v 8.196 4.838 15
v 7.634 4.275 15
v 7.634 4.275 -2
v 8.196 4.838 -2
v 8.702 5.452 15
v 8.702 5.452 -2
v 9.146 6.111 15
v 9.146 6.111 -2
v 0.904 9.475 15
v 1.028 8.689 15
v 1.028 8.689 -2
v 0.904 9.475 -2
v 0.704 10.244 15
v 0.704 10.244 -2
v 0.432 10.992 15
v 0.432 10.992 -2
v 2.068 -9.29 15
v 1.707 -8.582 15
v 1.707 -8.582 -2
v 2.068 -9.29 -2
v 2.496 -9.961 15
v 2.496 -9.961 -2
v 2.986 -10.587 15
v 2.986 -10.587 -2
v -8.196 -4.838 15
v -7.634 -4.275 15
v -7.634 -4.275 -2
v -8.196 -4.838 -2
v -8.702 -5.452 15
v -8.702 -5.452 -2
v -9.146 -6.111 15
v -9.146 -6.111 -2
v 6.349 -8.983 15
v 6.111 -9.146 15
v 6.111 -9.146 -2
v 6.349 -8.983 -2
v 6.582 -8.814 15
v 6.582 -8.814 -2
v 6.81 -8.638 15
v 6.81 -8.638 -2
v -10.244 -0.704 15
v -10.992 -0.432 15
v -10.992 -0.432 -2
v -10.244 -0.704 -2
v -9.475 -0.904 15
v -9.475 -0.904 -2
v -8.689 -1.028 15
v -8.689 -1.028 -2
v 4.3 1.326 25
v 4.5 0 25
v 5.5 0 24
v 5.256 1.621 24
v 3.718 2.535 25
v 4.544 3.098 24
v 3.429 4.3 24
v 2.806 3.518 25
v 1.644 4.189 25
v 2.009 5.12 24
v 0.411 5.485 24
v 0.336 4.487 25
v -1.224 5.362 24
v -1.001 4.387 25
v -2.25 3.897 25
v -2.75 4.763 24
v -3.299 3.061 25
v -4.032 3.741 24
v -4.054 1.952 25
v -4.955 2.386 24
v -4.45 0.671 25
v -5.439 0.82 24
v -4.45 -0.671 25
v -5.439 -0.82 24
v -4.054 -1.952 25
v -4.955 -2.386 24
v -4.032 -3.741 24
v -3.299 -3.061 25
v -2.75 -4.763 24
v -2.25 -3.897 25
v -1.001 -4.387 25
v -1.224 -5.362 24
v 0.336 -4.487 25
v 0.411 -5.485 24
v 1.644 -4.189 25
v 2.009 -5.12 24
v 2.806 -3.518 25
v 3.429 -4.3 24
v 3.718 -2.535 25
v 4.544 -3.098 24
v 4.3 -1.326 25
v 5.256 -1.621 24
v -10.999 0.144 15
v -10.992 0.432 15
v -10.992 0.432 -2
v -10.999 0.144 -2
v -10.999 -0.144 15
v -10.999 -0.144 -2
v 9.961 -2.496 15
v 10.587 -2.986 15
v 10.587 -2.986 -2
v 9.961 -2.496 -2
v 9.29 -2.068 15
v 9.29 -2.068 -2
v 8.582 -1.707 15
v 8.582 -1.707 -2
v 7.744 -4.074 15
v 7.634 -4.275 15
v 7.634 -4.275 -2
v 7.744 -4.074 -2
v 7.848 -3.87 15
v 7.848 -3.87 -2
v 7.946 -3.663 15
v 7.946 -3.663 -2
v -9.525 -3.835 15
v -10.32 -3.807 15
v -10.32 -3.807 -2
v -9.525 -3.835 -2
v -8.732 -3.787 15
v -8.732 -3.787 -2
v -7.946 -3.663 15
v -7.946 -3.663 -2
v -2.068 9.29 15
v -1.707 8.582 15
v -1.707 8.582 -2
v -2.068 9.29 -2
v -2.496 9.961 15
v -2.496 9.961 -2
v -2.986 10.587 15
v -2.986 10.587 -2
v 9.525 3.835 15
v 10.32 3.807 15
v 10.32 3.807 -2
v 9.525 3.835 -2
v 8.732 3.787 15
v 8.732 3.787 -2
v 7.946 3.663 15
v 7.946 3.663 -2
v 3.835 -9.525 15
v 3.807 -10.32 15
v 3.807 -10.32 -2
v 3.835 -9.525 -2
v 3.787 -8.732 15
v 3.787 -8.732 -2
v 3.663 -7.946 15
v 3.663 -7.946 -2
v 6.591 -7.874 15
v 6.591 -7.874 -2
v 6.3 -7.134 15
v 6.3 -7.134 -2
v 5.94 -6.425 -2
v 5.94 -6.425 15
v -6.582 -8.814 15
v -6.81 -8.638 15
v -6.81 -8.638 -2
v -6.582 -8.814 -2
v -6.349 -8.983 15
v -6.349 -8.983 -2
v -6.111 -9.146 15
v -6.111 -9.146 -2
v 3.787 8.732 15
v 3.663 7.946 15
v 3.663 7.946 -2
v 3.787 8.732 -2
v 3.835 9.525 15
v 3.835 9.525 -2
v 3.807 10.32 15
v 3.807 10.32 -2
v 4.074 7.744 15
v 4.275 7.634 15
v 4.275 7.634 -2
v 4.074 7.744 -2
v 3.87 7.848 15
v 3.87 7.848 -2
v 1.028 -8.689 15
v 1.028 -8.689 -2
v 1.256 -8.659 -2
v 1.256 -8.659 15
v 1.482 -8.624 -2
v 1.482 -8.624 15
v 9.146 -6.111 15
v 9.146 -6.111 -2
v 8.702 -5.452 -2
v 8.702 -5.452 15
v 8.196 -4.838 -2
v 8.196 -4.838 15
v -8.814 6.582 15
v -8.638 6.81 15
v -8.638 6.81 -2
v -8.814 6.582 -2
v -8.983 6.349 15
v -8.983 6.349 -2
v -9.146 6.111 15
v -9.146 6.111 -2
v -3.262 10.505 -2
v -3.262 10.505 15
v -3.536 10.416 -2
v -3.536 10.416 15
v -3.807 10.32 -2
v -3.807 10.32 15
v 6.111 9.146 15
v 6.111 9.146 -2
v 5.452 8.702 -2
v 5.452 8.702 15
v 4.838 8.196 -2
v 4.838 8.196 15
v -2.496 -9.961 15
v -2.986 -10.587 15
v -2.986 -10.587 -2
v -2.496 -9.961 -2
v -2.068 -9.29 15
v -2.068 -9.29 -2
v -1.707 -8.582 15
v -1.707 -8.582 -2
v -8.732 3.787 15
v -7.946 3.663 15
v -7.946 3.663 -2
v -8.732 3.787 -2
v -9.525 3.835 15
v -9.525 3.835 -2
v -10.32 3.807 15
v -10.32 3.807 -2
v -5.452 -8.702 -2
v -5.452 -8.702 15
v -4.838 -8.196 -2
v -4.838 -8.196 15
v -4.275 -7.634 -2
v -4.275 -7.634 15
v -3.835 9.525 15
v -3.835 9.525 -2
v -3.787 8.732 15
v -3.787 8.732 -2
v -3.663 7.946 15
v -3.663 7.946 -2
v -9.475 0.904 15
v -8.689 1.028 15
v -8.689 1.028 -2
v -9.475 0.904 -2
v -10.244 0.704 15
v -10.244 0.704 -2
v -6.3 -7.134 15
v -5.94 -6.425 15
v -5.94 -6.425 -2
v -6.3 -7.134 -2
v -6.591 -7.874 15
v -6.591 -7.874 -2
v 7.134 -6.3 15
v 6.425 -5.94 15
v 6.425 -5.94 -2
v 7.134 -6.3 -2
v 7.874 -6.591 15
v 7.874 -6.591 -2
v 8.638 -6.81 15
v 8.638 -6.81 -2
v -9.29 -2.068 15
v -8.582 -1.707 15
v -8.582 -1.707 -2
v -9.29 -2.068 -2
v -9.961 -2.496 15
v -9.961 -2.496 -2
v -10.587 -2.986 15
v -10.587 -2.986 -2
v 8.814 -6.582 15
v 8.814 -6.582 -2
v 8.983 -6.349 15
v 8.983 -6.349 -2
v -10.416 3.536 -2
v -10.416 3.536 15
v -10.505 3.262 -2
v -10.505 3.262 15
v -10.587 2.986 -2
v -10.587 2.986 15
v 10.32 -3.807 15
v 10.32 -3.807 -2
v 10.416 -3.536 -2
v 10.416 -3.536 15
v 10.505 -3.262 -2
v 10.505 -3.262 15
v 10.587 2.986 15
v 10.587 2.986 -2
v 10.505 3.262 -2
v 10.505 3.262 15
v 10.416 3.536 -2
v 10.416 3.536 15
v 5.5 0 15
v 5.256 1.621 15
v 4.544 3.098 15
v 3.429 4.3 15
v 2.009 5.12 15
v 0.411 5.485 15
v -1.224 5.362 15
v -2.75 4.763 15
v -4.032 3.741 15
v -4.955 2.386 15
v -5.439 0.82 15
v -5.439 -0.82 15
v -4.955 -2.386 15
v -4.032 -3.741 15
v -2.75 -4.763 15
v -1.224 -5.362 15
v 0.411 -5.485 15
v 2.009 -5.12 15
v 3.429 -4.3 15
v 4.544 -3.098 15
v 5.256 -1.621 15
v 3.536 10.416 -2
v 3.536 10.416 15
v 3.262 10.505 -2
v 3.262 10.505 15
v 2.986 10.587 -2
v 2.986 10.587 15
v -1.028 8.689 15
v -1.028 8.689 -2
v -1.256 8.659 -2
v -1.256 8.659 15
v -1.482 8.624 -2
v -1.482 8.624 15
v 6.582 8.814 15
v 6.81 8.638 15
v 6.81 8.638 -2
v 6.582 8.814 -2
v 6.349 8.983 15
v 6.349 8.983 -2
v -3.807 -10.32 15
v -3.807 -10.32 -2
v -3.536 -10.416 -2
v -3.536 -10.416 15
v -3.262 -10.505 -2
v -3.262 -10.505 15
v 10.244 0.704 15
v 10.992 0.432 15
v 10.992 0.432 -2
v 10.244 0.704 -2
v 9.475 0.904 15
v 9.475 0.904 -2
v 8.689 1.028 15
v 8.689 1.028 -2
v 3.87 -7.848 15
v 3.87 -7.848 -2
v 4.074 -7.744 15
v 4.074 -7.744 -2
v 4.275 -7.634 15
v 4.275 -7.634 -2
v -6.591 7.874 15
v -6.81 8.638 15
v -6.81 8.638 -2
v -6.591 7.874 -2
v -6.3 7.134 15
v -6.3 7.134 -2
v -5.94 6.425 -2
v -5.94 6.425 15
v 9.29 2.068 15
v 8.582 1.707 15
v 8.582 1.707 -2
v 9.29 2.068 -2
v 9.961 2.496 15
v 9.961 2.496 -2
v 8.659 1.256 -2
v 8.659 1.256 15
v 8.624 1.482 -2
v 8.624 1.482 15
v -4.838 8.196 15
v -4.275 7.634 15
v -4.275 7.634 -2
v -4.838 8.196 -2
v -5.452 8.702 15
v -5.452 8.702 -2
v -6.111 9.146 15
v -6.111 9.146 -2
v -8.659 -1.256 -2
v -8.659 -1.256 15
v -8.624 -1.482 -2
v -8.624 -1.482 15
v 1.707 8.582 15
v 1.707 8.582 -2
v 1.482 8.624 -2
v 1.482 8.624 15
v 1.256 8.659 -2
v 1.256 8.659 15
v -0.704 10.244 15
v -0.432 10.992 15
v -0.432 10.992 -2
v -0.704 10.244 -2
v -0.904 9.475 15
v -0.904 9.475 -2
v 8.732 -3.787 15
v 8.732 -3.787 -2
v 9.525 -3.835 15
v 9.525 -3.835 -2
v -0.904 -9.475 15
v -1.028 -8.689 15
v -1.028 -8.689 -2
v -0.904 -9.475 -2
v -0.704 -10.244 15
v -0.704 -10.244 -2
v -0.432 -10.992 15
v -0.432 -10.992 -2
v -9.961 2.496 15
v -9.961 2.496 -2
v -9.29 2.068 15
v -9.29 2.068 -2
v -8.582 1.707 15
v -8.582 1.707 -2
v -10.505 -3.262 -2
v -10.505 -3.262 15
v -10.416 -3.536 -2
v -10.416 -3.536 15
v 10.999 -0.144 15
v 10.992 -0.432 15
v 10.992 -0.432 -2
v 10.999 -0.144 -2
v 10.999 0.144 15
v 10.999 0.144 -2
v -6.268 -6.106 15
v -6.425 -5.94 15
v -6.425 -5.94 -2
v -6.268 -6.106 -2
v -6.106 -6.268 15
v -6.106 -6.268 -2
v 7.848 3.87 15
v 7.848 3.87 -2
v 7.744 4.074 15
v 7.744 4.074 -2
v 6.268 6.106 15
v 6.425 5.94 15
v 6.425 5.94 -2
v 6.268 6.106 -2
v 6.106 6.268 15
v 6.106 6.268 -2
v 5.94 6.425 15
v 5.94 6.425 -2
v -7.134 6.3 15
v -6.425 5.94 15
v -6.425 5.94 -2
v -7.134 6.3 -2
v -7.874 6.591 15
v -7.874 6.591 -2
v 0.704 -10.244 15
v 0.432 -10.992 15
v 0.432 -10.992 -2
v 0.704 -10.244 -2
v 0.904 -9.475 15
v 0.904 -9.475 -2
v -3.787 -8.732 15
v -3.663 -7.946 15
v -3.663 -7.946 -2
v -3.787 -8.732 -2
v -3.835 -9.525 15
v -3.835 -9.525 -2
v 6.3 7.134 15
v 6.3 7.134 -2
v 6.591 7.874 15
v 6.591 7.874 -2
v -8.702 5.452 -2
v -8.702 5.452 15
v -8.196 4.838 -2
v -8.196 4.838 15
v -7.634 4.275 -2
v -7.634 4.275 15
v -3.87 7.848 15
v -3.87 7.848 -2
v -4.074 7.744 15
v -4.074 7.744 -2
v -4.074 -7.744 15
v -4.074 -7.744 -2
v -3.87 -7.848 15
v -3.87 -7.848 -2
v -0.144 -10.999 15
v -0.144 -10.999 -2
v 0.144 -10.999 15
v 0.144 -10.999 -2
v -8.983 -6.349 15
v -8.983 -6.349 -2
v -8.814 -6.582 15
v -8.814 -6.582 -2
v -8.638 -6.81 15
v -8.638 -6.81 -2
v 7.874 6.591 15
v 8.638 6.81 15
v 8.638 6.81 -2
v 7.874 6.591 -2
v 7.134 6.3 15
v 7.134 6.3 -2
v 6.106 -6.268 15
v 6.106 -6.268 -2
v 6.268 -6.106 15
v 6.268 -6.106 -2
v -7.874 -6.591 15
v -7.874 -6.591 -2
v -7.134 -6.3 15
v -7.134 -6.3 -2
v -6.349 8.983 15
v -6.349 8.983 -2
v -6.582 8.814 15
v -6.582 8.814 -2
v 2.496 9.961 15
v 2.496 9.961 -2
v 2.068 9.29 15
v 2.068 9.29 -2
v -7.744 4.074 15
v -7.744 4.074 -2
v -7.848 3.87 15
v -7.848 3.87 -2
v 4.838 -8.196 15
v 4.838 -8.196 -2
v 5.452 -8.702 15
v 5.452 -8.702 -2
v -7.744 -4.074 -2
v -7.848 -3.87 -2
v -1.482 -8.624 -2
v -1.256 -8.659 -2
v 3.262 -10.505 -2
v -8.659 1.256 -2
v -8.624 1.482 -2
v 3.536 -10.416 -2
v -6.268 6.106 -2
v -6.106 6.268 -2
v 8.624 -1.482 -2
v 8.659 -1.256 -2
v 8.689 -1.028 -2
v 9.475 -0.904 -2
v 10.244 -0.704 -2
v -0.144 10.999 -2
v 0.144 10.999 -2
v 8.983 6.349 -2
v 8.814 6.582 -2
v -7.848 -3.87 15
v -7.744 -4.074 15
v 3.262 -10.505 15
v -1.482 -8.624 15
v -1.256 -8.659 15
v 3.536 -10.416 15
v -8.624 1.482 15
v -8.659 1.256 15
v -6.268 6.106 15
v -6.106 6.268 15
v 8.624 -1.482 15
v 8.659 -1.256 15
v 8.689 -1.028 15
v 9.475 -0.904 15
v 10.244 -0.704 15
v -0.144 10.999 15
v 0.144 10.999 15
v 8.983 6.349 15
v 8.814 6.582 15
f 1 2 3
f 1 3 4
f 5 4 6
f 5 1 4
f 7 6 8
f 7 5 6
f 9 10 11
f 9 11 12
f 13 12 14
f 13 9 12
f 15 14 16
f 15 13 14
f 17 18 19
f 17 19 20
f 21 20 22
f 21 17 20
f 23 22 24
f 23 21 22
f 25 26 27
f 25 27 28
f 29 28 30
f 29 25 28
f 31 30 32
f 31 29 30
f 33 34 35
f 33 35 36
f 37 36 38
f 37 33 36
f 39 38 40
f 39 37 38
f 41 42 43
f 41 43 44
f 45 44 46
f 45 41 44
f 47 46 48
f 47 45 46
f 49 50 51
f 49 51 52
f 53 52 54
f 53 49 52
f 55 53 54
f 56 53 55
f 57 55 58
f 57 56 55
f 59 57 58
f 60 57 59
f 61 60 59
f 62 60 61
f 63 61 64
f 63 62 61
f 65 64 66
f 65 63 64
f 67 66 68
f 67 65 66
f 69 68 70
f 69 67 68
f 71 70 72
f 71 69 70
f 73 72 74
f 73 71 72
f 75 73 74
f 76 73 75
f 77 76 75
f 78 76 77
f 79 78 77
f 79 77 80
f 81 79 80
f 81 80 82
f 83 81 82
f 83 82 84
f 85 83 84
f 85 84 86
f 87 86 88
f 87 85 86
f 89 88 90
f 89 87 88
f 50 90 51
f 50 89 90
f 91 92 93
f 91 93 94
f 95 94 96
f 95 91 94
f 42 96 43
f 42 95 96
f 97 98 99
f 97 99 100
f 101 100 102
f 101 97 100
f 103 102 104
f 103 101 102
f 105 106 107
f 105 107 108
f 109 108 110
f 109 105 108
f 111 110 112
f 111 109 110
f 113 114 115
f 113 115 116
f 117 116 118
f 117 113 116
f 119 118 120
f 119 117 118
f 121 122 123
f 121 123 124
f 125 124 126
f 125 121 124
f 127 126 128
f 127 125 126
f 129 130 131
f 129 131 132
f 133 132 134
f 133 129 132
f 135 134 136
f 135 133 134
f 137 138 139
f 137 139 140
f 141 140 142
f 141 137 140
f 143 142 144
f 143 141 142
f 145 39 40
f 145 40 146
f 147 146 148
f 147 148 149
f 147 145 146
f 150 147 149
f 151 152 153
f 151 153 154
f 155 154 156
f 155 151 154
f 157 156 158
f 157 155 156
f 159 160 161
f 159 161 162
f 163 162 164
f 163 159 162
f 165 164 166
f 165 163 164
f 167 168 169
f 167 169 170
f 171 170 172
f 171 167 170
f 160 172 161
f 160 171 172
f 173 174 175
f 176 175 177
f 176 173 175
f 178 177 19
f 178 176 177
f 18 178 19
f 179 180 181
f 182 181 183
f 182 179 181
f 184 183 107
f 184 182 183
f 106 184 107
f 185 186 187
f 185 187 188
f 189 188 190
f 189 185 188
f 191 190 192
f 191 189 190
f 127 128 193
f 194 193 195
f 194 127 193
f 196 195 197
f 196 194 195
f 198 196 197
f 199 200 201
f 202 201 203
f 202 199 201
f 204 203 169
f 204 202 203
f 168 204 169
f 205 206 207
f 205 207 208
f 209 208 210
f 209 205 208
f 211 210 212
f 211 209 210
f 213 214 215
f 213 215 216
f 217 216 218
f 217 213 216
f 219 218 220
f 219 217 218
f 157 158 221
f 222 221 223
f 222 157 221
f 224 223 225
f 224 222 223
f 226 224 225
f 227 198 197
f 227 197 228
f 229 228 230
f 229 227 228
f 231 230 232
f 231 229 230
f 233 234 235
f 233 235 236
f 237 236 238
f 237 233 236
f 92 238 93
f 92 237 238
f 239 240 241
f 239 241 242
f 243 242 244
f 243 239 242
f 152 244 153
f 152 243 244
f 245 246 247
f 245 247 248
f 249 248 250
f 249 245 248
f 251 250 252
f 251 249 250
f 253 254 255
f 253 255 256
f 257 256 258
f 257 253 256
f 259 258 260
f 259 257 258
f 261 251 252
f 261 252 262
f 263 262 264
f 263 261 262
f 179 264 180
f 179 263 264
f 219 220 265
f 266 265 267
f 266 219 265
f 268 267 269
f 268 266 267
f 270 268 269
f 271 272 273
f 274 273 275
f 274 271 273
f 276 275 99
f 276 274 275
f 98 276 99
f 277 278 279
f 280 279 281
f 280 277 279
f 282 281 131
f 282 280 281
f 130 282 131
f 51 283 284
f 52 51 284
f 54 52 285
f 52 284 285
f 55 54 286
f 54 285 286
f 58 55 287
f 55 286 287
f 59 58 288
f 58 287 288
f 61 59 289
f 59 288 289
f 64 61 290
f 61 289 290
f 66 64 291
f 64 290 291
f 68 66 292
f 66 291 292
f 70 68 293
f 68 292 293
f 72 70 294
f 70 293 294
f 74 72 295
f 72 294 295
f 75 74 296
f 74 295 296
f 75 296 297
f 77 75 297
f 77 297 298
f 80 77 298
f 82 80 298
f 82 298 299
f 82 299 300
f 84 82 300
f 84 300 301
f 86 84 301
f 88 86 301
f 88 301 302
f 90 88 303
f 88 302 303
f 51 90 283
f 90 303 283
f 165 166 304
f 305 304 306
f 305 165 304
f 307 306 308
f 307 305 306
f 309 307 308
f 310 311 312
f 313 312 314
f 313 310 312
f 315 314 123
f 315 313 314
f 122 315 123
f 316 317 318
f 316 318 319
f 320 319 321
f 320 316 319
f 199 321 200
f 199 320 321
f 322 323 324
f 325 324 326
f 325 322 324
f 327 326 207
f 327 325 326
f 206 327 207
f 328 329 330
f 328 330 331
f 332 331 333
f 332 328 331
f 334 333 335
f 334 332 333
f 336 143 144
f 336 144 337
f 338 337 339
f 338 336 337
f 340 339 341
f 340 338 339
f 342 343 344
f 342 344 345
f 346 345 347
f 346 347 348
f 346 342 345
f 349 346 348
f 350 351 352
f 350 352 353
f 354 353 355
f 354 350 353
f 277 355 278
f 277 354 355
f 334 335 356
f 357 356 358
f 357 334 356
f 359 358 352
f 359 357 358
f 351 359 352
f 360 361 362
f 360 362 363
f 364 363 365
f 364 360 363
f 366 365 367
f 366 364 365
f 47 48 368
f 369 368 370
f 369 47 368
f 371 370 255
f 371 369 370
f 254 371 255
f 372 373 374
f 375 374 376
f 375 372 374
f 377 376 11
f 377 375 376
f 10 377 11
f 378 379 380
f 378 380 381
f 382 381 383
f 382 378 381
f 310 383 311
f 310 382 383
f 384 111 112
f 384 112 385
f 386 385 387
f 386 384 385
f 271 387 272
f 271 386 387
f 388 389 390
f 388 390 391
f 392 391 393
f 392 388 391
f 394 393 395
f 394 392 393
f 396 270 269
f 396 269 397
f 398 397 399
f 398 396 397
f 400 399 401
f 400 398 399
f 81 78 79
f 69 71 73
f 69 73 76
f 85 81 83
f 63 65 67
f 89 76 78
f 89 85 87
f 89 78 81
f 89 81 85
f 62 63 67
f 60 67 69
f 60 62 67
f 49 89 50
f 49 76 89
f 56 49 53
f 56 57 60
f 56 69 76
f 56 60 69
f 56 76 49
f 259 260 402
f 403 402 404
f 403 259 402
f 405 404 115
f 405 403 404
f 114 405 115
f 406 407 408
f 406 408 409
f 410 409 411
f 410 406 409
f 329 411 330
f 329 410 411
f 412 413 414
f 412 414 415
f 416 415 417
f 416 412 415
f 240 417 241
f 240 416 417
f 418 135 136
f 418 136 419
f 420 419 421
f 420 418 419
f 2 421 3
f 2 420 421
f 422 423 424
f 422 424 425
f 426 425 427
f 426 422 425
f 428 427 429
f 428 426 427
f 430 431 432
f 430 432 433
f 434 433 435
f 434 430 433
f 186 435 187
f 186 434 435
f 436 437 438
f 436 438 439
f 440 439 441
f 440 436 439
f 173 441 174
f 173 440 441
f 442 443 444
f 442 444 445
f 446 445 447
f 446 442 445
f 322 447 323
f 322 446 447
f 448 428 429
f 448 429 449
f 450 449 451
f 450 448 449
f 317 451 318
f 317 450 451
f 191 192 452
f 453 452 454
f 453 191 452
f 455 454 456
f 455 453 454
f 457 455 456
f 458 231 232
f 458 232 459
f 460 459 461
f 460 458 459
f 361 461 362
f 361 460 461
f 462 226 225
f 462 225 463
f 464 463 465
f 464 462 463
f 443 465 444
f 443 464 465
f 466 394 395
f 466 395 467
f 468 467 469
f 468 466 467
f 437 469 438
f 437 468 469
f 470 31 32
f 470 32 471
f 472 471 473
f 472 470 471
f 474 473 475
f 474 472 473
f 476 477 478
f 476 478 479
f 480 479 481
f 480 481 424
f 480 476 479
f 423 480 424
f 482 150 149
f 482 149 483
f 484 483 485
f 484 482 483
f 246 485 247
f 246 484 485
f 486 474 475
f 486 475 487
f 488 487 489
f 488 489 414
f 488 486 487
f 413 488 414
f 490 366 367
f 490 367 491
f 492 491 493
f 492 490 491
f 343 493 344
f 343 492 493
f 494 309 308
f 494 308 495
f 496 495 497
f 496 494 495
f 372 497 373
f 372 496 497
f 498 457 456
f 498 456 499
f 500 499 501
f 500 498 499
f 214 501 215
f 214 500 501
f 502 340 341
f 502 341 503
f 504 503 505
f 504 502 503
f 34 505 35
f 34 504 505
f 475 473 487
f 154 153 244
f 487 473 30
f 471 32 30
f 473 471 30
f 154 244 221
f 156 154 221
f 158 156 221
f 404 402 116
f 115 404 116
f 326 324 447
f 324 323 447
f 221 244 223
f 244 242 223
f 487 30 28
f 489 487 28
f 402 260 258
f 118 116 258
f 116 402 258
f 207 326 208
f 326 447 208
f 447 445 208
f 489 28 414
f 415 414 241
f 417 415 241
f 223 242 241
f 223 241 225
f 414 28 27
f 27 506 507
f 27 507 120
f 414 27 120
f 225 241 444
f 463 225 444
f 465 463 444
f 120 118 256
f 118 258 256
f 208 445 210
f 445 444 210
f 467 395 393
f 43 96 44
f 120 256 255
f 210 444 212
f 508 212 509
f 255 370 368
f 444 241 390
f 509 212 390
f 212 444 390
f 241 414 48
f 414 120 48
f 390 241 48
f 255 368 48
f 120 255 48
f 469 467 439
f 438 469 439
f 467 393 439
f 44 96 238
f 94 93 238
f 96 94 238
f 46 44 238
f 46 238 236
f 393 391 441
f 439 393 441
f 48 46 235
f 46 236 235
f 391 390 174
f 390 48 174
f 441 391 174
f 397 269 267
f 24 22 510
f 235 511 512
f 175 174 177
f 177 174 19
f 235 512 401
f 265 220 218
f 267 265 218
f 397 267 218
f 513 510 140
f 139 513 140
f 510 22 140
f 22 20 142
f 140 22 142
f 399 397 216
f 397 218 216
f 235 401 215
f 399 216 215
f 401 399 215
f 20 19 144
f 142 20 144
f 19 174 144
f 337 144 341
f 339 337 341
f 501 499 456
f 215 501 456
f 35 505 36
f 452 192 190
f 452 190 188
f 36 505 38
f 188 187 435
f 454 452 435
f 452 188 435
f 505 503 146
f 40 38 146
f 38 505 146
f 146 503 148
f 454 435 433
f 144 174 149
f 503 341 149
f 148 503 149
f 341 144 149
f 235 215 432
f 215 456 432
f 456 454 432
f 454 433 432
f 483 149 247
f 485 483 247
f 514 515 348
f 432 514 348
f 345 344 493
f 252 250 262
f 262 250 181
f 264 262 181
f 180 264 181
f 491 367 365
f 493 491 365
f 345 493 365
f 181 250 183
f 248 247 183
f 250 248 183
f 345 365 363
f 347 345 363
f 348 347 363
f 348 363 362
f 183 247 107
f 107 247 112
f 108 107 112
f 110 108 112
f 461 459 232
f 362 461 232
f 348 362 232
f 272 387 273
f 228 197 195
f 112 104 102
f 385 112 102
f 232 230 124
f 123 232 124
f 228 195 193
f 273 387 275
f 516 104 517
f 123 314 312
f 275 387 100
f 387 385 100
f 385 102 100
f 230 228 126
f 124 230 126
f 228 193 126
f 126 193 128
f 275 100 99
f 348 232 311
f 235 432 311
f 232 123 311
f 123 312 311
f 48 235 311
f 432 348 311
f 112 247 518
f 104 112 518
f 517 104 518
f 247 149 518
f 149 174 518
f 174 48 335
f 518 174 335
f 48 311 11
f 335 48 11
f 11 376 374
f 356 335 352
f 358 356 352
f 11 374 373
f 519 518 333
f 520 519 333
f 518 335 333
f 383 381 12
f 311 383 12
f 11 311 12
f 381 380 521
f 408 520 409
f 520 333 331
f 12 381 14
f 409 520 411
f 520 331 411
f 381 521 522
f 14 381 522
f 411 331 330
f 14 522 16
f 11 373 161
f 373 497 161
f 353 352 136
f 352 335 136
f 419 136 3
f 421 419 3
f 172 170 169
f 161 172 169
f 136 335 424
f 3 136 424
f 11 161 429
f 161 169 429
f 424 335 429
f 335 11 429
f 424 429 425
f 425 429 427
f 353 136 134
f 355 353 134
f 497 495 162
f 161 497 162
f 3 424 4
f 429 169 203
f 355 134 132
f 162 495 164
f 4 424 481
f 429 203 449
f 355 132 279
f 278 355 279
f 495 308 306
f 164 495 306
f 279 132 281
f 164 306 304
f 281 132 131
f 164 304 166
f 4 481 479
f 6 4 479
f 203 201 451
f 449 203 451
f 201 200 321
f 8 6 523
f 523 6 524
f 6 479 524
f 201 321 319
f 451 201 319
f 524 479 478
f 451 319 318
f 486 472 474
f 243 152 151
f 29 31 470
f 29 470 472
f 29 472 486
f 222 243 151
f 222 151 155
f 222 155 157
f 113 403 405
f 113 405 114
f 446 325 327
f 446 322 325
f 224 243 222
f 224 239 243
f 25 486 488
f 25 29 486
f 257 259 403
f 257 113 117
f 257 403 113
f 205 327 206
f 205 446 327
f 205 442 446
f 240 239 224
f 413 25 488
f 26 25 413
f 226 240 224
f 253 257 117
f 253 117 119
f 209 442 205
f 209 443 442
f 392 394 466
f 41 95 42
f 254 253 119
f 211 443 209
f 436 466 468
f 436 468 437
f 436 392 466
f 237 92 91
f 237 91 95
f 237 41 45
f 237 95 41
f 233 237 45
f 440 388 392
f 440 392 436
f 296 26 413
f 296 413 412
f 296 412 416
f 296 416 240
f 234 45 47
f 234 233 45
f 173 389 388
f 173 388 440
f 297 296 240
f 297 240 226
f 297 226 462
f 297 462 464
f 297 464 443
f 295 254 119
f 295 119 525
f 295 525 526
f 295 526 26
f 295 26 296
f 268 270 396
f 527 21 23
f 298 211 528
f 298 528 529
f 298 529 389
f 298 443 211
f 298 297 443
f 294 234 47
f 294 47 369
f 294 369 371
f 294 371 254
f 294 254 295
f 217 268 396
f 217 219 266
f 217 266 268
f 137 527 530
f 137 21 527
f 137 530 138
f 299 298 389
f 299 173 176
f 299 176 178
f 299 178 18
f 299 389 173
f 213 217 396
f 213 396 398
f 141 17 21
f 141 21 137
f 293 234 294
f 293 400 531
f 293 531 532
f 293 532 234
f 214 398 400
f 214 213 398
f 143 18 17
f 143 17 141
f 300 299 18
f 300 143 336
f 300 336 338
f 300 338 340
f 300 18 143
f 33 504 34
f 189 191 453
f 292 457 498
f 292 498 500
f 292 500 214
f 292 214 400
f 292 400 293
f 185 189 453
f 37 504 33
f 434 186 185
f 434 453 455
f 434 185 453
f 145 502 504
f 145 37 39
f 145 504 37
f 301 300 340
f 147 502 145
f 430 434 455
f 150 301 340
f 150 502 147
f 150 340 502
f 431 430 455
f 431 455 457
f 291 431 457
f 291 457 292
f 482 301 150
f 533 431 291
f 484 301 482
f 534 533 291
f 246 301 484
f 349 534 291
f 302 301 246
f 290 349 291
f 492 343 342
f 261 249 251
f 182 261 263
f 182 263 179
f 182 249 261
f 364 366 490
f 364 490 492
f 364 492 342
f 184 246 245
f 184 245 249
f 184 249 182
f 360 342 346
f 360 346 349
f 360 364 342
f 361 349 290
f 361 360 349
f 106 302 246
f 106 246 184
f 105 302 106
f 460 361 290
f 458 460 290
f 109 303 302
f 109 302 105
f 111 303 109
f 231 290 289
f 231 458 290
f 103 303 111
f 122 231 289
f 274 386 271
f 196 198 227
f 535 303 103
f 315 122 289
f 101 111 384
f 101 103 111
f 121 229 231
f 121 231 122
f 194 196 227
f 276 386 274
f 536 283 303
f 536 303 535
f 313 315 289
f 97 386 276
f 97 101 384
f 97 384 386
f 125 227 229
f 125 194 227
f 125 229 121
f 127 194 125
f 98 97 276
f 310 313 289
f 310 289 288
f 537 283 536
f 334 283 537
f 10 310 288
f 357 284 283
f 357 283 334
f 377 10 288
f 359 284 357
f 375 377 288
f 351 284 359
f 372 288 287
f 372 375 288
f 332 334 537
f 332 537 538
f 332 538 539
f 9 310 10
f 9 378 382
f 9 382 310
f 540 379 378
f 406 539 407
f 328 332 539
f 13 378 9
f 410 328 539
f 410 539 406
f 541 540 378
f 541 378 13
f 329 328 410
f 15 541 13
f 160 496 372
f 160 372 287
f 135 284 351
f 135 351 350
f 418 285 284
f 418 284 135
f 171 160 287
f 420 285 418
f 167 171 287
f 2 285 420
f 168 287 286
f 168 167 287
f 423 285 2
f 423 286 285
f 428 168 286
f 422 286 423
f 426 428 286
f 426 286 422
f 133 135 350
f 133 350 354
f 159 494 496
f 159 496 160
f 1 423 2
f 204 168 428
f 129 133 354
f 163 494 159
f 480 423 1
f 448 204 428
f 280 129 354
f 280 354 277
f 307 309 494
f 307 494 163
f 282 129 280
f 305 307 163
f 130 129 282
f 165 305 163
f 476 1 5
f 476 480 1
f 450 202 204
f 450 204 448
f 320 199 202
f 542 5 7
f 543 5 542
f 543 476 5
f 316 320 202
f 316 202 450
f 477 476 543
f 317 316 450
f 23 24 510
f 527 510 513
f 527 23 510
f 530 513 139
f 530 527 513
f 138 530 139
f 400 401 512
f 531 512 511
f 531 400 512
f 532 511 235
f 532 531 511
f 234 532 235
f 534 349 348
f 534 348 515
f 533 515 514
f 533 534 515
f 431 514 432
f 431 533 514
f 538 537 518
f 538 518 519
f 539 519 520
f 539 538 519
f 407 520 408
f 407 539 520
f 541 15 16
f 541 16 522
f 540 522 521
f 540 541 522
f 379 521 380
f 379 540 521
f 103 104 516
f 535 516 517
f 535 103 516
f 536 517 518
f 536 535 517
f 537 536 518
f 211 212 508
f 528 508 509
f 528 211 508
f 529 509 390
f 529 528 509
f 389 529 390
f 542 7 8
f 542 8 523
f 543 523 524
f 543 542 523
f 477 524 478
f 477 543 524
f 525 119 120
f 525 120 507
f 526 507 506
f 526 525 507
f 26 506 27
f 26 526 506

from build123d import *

# Parameters (mm, degrees)
AUFSATZ_LINEAR_AUSTRAGEN1_DEPTH = 17
SKIZZE2_R                       = 5.5
AUFSATZ_LINEAR_AUSTRAGEN3_DEPTH = 10
FASE1_SIZE                      = 1


with BuildPart() as part:
    # Skizze1 → Aufsatz-Linear austragen1 (new body)
    with BuildSketch(Plane.XY.offset(14.999999972)):
        with BuildLine():
            ThreePointArc((-1.707040323, 8.581871229), (-2.274158717, 9.63053951), (-2.985844941, 10.587007573))
            ThreePointArc((-2.985844941, 10.587007573), (-3.399186929, 10.461621652), (-3.807287618, 10.320104668))
            ThreePointArc((-3.807287618, 10.320104668), (-3.820856046, 9.127987084), (-3.663272714, 7.946252795))
            ThreePointArc((-3.663272714, 7.946252795), (-3.972416885, 7.79630711), (-4.275435876, 7.634340085))
            ThreePointArc((-4.275435876, 7.634340085), (-5.138853841, 8.456433665), (-6.111272547, 9.146165711))
            ThreePointArc((-6.111272547, 9.146165711), (-6.465637758, 8.899186915), (-6.810033424, 8.638486217))
            ThreePointArc((-6.810033424, 8.638486217), (-6.454553173, 7.500522146), (-5.939506541, 6.425321977))
            ThreePointArc((-5.939506541, 6.425321977), (-6.187184354, 6.187184354), (-6.425321977, 5.939506541))
            ThreePointArc((-6.425321977, 5.939506541), (-7.500522146, 6.454553173), (-8.638486217, 6.810033424))
            ThreePointArc((-8.638486217, 6.810033424), (-8.899186915, 6.465637758), (-9.146165711, 6.111272547))
            ThreePointArc((-9.146165711, 6.111272547), (-8.456433665, 5.138853841), (-7.634340085, 4.275435876))
            ThreePointArc((-7.634340085, 4.275435876), (-7.79630711, 3.972416885), (-7.946252795, 3.663272714))
            ThreePointArc((-7.946252795, 3.663272714), (-9.127987084, 3.820856046), (-10.320104668, 3.807287618))
            ThreePointArc((-10.320104668, 3.807287618), (-10.461621652, 3.399186929), (-10.587007573, 2.985844941))
            ThreePointArc((-10.587007573, 2.985844941), (-9.63053951, 2.274158717), (-8.581871229, 1.707040323))
            ThreePointArc((-8.581871229, 1.707040323), (-8.642273006, 1.368801573), (-8.689349024, 1.028452231))
            ThreePointArc((-8.689349024, 1.028452231), (-9.861941048, 0.813146907), (-10.99151937, 0.431857972))
            ThreePointArc((-10.99151937, 0.431857972), (-10.999999971, 0), (-10.99151937, -0.431857972))
            ThreePointArc((-10.99151937, -0.431857972), (-9.861941048, -0.813146907), (-8.689349024, -1.028452231))
            ThreePointArc((-8.689349024, -1.028452231), (-8.642273006, -1.368801573), (-8.581871229, -1.707040323))
            ThreePointArc((-8.581871229, -1.707040323), (-9.63053951, -2.274158717), (-10.587007573, -2.985844941))
            ThreePointArc((-10.587007573, -2.985844941), (-10.461621652, -3.399186929), (-10.320104668, -3.807287618))
            ThreePointArc((-10.320104668, -3.807287618), (-9.127987084, -3.820856046), (-7.946252795, -3.663272714))
            ThreePointArc((-7.946252795, -3.663272714), (-7.79630711, -3.972416885), (-7.634340085, -4.275435876))
            ThreePointArc((-7.634340085, -4.275435876), (-8.456433665, -5.138853841), (-9.146165711, -6.111272547))
            ThreePointArc((-9.146165711, -6.111272547), (-8.899186915, -6.465637758), (-8.638486217, -6.810033424))
            ThreePointArc((-8.638486217, -6.810033424), (-7.500522146, -6.454553173), (-6.425321977, -5.939506541))
            ThreePointArc((-6.425321977, -5.939506541), (-6.187184354, -6.187184354), (-5.939506541, -6.425321977))
            ThreePointArc((-5.939506541, -6.425321977), (-6.454553173, -7.500522146), (-6.810033424, -8.638486217))
            ThreePointArc((-6.810033424, -8.638486217), (-6.465637758, -8.899186915), (-6.111272547, -9.146165711))
            ThreePointArc((-6.111272547, -9.146165711), (-5.138853841, -8.456433665), (-4.275435876, -7.634340085))
            ThreePointArc((-4.275435876, -7.634340085), (-3.972416885, -7.79630711), (-3.663272714, -7.946252795))
            ThreePointArc((-3.663272714, -7.946252795), (-3.820856046, -9.127987084), (-3.807287618, -10.320104668))
            ThreePointArc((-3.807287618, -10.320104668), (-3.399186929, -10.461621652), (-2.985844941, -10.587007573))
            ThreePointArc((-2.985844941, -10.587007573), (-2.274158717, -9.63053951), (-1.707040323, -8.581871229))
            ThreePointArc((-1.707040323, -8.581871229), (-1.368801573, -8.642273006), (-1.028452231, -8.689349024))
            ThreePointArc((-1.028452231, -8.689349024), (-0.813146907, -9.861941048), (-0.431857972, -10.99151937))
            ThreePointArc((-0.431857972, -10.99151937), (0, -10.999999971), (0.431857972, -10.99151937))
            ThreePointArc((0.431857972, -10.99151937), (0.813146907, -9.861941048), (1.028452231, -8.689349024))
            ThreePointArc((1.028452231, -8.689349024), (1.368801573, -8.642273006), (1.707040323, -8.581871229))
            ThreePointArc((1.707040323, -8.581871229), (2.274158717, -9.63053951), (2.985844941, -10.587007573))
            ThreePointArc((2.985844941, -10.587007573), (3.399186929, -10.461621652), (3.807287618, -10.320104668))
            ThreePointArc((3.807287618, -10.320104668), (3.820856046, -9.127987084), (3.663272714, -7.946252795))
            ThreePointArc((3.663272714, -7.946252795), (3.972416885, -7.79630711), (4.275435876, -7.634340085))
            ThreePointArc((4.275435876, -7.634340085), (5.138853841, -8.456433665), (6.111272547, -9.146165711))
            ThreePointArc((6.111272547, -9.146165711), (6.465637758, -8.899186915), (6.810033424, -8.638486217))
            ThreePointArc((6.810033424, -8.638486217), (6.454553173, -7.500522146), (5.939506541, -6.425321977))
            ThreePointArc((5.939506541, -6.425321977), (6.187184354, -6.187184354), (6.425321977, -5.939506541))
            ThreePointArc((6.425321977, -5.939506541), (7.500522146, -6.454553173), (8.638486217, -6.810033424))
            ThreePointArc((8.638486217, -6.810033424), (8.899186915, -6.465637758), (9.146165711, -6.111272547))
            ThreePointArc((9.146165711, -6.111272547), (8.456433665, -5.138853841), (7.634340085, -4.275435876))
            ThreePointArc((7.634340085, -4.275435876), (7.79630711, -3.972416885), (7.946252795, -3.663272714))
            ThreePointArc((7.946252795, -3.663272714), (9.127987084, -3.820856046), (10.320104668, -3.807287618))
            ThreePointArc((10.320104668, -3.807287618), (10.461621652, -3.399186929), (10.587007573, -2.985844941))
            ThreePointArc((10.587007573, -2.985844941), (9.63053951, -2.274158717), (8.581871229, -1.707040323))
            ThreePointArc((8.581871229, -1.707040323), (8.642273006, -1.368801573), (8.689349024, -1.028452231))
            ThreePointArc((8.689349024, -1.028452231), (9.861941048, -0.813146907), (10.99151937, -0.431857972))
            ThreePointArc((10.99151937, -0.431857972), (10.999999971, 0), (10.99151937, 0.431857972))
            ThreePointArc((10.99151937, 0.431857972), (9.861941048, 0.813146907), (8.689349024, 1.028452231))
            ThreePointArc((8.689349024, 1.028452231), (8.642273006, 1.368801573), (8.581871229, 1.707040323))
            ThreePointArc((8.581871229, 1.707040323), (9.63053951, 2.274158717), (10.587007573, 2.985844941))
            ThreePointArc((10.587007573, 2.985844941), (10.461621652, 3.399186929), (10.320104668, 3.807287618))
            ThreePointArc((10.320104668, 3.807287618), (9.127987084, 3.820856046), (7.946252795, 3.663272714))
            ThreePointArc((7.946252795, 3.663272714), (7.79630711, 3.972416885), (7.634340085, 4.275435876))
            ThreePointArc((7.634340085, 4.275435876), (8.456433665, 5.138853841), (9.146165711, 6.111272547))
            ThreePointArc((9.146165711, 6.111272547), (8.899186915, 6.465637758), (8.638486217, 6.810033424))
            ThreePointArc((8.638486217, 6.810033424), (7.500522146, 6.454553173), (6.425321977, 5.939506541))
            ThreePointArc((6.425321977, 5.939506541), (6.187184354, 6.187184354), (5.939506541, 6.425321977))
            ThreePointArc((5.939506541, 6.425321977), (6.454553173, 7.500522146), (6.810033424, 8.638486217))
            ThreePointArc((6.810033424, 8.638486217), (6.465637758, 8.899186915), (6.111272547, 9.146165711))
            ThreePointArc((6.111272547, 9.146165711), (5.138853841, 8.456433665), (4.275435876, 7.634340085))
            ThreePointArc((4.275435876, 7.634340085), (3.972416885, 7.79630711), (3.663272714, 7.946252795))
            ThreePointArc((3.663272714, 7.946252795), (3.820856046, 9.127987084), (3.807287618, 10.320104668))
            ThreePointArc((3.807287618, 10.320104668), (3.399186929, 10.461621652), (2.985844941, 10.587007573))
            ThreePointArc((2.985844941, 10.587007573), (2.274158717, 9.63053951), (1.707040323, 8.581871229))
            ThreePointArc((1.707040323, 8.581871229), (1.368801573, 8.642273006), (1.028452231, 8.689349024))
            ThreePointArc((1.028452231, 8.689349024), (0.813146907, 9.861941048), (0.431857972, 10.99151937))
            ThreePointArc((0.431857972, 10.99151937), (0, 10.999999971), (-0.431857972, 10.99151937))
            ThreePointArc((-0.431857972, 10.99151937), (-0.813146907, 9.861941048), (-1.028452231, 8.689349024))
            ThreePointArc((-1.028452231, 8.689349024), (-1.368801573, 8.642273006), (-1.707040323, 8.581871229))
        make_face()
    extrude(amount=-AUFSATZ_LINEAR_AUSTRAGEN1_DEPTH)

    # Skizze2 → Aufsatz-Linear austragen3 (add)
    with BuildSketch(Plane.XY.offset(14.999999972)):
        Circle(SKIZZE2_R)
    extrude(amount=AUFSATZ_LINEAR_AUSTRAGEN3_DEPTH)

    # Fase1
    fase1_edges = [part.edges().sort_by_distance(p)[0] for p in [
        (-5.5, 0, 24.999999972),
    ]]
    chamfer(fase1_edges, length=FASE1_SIZE)


solid = part.part
